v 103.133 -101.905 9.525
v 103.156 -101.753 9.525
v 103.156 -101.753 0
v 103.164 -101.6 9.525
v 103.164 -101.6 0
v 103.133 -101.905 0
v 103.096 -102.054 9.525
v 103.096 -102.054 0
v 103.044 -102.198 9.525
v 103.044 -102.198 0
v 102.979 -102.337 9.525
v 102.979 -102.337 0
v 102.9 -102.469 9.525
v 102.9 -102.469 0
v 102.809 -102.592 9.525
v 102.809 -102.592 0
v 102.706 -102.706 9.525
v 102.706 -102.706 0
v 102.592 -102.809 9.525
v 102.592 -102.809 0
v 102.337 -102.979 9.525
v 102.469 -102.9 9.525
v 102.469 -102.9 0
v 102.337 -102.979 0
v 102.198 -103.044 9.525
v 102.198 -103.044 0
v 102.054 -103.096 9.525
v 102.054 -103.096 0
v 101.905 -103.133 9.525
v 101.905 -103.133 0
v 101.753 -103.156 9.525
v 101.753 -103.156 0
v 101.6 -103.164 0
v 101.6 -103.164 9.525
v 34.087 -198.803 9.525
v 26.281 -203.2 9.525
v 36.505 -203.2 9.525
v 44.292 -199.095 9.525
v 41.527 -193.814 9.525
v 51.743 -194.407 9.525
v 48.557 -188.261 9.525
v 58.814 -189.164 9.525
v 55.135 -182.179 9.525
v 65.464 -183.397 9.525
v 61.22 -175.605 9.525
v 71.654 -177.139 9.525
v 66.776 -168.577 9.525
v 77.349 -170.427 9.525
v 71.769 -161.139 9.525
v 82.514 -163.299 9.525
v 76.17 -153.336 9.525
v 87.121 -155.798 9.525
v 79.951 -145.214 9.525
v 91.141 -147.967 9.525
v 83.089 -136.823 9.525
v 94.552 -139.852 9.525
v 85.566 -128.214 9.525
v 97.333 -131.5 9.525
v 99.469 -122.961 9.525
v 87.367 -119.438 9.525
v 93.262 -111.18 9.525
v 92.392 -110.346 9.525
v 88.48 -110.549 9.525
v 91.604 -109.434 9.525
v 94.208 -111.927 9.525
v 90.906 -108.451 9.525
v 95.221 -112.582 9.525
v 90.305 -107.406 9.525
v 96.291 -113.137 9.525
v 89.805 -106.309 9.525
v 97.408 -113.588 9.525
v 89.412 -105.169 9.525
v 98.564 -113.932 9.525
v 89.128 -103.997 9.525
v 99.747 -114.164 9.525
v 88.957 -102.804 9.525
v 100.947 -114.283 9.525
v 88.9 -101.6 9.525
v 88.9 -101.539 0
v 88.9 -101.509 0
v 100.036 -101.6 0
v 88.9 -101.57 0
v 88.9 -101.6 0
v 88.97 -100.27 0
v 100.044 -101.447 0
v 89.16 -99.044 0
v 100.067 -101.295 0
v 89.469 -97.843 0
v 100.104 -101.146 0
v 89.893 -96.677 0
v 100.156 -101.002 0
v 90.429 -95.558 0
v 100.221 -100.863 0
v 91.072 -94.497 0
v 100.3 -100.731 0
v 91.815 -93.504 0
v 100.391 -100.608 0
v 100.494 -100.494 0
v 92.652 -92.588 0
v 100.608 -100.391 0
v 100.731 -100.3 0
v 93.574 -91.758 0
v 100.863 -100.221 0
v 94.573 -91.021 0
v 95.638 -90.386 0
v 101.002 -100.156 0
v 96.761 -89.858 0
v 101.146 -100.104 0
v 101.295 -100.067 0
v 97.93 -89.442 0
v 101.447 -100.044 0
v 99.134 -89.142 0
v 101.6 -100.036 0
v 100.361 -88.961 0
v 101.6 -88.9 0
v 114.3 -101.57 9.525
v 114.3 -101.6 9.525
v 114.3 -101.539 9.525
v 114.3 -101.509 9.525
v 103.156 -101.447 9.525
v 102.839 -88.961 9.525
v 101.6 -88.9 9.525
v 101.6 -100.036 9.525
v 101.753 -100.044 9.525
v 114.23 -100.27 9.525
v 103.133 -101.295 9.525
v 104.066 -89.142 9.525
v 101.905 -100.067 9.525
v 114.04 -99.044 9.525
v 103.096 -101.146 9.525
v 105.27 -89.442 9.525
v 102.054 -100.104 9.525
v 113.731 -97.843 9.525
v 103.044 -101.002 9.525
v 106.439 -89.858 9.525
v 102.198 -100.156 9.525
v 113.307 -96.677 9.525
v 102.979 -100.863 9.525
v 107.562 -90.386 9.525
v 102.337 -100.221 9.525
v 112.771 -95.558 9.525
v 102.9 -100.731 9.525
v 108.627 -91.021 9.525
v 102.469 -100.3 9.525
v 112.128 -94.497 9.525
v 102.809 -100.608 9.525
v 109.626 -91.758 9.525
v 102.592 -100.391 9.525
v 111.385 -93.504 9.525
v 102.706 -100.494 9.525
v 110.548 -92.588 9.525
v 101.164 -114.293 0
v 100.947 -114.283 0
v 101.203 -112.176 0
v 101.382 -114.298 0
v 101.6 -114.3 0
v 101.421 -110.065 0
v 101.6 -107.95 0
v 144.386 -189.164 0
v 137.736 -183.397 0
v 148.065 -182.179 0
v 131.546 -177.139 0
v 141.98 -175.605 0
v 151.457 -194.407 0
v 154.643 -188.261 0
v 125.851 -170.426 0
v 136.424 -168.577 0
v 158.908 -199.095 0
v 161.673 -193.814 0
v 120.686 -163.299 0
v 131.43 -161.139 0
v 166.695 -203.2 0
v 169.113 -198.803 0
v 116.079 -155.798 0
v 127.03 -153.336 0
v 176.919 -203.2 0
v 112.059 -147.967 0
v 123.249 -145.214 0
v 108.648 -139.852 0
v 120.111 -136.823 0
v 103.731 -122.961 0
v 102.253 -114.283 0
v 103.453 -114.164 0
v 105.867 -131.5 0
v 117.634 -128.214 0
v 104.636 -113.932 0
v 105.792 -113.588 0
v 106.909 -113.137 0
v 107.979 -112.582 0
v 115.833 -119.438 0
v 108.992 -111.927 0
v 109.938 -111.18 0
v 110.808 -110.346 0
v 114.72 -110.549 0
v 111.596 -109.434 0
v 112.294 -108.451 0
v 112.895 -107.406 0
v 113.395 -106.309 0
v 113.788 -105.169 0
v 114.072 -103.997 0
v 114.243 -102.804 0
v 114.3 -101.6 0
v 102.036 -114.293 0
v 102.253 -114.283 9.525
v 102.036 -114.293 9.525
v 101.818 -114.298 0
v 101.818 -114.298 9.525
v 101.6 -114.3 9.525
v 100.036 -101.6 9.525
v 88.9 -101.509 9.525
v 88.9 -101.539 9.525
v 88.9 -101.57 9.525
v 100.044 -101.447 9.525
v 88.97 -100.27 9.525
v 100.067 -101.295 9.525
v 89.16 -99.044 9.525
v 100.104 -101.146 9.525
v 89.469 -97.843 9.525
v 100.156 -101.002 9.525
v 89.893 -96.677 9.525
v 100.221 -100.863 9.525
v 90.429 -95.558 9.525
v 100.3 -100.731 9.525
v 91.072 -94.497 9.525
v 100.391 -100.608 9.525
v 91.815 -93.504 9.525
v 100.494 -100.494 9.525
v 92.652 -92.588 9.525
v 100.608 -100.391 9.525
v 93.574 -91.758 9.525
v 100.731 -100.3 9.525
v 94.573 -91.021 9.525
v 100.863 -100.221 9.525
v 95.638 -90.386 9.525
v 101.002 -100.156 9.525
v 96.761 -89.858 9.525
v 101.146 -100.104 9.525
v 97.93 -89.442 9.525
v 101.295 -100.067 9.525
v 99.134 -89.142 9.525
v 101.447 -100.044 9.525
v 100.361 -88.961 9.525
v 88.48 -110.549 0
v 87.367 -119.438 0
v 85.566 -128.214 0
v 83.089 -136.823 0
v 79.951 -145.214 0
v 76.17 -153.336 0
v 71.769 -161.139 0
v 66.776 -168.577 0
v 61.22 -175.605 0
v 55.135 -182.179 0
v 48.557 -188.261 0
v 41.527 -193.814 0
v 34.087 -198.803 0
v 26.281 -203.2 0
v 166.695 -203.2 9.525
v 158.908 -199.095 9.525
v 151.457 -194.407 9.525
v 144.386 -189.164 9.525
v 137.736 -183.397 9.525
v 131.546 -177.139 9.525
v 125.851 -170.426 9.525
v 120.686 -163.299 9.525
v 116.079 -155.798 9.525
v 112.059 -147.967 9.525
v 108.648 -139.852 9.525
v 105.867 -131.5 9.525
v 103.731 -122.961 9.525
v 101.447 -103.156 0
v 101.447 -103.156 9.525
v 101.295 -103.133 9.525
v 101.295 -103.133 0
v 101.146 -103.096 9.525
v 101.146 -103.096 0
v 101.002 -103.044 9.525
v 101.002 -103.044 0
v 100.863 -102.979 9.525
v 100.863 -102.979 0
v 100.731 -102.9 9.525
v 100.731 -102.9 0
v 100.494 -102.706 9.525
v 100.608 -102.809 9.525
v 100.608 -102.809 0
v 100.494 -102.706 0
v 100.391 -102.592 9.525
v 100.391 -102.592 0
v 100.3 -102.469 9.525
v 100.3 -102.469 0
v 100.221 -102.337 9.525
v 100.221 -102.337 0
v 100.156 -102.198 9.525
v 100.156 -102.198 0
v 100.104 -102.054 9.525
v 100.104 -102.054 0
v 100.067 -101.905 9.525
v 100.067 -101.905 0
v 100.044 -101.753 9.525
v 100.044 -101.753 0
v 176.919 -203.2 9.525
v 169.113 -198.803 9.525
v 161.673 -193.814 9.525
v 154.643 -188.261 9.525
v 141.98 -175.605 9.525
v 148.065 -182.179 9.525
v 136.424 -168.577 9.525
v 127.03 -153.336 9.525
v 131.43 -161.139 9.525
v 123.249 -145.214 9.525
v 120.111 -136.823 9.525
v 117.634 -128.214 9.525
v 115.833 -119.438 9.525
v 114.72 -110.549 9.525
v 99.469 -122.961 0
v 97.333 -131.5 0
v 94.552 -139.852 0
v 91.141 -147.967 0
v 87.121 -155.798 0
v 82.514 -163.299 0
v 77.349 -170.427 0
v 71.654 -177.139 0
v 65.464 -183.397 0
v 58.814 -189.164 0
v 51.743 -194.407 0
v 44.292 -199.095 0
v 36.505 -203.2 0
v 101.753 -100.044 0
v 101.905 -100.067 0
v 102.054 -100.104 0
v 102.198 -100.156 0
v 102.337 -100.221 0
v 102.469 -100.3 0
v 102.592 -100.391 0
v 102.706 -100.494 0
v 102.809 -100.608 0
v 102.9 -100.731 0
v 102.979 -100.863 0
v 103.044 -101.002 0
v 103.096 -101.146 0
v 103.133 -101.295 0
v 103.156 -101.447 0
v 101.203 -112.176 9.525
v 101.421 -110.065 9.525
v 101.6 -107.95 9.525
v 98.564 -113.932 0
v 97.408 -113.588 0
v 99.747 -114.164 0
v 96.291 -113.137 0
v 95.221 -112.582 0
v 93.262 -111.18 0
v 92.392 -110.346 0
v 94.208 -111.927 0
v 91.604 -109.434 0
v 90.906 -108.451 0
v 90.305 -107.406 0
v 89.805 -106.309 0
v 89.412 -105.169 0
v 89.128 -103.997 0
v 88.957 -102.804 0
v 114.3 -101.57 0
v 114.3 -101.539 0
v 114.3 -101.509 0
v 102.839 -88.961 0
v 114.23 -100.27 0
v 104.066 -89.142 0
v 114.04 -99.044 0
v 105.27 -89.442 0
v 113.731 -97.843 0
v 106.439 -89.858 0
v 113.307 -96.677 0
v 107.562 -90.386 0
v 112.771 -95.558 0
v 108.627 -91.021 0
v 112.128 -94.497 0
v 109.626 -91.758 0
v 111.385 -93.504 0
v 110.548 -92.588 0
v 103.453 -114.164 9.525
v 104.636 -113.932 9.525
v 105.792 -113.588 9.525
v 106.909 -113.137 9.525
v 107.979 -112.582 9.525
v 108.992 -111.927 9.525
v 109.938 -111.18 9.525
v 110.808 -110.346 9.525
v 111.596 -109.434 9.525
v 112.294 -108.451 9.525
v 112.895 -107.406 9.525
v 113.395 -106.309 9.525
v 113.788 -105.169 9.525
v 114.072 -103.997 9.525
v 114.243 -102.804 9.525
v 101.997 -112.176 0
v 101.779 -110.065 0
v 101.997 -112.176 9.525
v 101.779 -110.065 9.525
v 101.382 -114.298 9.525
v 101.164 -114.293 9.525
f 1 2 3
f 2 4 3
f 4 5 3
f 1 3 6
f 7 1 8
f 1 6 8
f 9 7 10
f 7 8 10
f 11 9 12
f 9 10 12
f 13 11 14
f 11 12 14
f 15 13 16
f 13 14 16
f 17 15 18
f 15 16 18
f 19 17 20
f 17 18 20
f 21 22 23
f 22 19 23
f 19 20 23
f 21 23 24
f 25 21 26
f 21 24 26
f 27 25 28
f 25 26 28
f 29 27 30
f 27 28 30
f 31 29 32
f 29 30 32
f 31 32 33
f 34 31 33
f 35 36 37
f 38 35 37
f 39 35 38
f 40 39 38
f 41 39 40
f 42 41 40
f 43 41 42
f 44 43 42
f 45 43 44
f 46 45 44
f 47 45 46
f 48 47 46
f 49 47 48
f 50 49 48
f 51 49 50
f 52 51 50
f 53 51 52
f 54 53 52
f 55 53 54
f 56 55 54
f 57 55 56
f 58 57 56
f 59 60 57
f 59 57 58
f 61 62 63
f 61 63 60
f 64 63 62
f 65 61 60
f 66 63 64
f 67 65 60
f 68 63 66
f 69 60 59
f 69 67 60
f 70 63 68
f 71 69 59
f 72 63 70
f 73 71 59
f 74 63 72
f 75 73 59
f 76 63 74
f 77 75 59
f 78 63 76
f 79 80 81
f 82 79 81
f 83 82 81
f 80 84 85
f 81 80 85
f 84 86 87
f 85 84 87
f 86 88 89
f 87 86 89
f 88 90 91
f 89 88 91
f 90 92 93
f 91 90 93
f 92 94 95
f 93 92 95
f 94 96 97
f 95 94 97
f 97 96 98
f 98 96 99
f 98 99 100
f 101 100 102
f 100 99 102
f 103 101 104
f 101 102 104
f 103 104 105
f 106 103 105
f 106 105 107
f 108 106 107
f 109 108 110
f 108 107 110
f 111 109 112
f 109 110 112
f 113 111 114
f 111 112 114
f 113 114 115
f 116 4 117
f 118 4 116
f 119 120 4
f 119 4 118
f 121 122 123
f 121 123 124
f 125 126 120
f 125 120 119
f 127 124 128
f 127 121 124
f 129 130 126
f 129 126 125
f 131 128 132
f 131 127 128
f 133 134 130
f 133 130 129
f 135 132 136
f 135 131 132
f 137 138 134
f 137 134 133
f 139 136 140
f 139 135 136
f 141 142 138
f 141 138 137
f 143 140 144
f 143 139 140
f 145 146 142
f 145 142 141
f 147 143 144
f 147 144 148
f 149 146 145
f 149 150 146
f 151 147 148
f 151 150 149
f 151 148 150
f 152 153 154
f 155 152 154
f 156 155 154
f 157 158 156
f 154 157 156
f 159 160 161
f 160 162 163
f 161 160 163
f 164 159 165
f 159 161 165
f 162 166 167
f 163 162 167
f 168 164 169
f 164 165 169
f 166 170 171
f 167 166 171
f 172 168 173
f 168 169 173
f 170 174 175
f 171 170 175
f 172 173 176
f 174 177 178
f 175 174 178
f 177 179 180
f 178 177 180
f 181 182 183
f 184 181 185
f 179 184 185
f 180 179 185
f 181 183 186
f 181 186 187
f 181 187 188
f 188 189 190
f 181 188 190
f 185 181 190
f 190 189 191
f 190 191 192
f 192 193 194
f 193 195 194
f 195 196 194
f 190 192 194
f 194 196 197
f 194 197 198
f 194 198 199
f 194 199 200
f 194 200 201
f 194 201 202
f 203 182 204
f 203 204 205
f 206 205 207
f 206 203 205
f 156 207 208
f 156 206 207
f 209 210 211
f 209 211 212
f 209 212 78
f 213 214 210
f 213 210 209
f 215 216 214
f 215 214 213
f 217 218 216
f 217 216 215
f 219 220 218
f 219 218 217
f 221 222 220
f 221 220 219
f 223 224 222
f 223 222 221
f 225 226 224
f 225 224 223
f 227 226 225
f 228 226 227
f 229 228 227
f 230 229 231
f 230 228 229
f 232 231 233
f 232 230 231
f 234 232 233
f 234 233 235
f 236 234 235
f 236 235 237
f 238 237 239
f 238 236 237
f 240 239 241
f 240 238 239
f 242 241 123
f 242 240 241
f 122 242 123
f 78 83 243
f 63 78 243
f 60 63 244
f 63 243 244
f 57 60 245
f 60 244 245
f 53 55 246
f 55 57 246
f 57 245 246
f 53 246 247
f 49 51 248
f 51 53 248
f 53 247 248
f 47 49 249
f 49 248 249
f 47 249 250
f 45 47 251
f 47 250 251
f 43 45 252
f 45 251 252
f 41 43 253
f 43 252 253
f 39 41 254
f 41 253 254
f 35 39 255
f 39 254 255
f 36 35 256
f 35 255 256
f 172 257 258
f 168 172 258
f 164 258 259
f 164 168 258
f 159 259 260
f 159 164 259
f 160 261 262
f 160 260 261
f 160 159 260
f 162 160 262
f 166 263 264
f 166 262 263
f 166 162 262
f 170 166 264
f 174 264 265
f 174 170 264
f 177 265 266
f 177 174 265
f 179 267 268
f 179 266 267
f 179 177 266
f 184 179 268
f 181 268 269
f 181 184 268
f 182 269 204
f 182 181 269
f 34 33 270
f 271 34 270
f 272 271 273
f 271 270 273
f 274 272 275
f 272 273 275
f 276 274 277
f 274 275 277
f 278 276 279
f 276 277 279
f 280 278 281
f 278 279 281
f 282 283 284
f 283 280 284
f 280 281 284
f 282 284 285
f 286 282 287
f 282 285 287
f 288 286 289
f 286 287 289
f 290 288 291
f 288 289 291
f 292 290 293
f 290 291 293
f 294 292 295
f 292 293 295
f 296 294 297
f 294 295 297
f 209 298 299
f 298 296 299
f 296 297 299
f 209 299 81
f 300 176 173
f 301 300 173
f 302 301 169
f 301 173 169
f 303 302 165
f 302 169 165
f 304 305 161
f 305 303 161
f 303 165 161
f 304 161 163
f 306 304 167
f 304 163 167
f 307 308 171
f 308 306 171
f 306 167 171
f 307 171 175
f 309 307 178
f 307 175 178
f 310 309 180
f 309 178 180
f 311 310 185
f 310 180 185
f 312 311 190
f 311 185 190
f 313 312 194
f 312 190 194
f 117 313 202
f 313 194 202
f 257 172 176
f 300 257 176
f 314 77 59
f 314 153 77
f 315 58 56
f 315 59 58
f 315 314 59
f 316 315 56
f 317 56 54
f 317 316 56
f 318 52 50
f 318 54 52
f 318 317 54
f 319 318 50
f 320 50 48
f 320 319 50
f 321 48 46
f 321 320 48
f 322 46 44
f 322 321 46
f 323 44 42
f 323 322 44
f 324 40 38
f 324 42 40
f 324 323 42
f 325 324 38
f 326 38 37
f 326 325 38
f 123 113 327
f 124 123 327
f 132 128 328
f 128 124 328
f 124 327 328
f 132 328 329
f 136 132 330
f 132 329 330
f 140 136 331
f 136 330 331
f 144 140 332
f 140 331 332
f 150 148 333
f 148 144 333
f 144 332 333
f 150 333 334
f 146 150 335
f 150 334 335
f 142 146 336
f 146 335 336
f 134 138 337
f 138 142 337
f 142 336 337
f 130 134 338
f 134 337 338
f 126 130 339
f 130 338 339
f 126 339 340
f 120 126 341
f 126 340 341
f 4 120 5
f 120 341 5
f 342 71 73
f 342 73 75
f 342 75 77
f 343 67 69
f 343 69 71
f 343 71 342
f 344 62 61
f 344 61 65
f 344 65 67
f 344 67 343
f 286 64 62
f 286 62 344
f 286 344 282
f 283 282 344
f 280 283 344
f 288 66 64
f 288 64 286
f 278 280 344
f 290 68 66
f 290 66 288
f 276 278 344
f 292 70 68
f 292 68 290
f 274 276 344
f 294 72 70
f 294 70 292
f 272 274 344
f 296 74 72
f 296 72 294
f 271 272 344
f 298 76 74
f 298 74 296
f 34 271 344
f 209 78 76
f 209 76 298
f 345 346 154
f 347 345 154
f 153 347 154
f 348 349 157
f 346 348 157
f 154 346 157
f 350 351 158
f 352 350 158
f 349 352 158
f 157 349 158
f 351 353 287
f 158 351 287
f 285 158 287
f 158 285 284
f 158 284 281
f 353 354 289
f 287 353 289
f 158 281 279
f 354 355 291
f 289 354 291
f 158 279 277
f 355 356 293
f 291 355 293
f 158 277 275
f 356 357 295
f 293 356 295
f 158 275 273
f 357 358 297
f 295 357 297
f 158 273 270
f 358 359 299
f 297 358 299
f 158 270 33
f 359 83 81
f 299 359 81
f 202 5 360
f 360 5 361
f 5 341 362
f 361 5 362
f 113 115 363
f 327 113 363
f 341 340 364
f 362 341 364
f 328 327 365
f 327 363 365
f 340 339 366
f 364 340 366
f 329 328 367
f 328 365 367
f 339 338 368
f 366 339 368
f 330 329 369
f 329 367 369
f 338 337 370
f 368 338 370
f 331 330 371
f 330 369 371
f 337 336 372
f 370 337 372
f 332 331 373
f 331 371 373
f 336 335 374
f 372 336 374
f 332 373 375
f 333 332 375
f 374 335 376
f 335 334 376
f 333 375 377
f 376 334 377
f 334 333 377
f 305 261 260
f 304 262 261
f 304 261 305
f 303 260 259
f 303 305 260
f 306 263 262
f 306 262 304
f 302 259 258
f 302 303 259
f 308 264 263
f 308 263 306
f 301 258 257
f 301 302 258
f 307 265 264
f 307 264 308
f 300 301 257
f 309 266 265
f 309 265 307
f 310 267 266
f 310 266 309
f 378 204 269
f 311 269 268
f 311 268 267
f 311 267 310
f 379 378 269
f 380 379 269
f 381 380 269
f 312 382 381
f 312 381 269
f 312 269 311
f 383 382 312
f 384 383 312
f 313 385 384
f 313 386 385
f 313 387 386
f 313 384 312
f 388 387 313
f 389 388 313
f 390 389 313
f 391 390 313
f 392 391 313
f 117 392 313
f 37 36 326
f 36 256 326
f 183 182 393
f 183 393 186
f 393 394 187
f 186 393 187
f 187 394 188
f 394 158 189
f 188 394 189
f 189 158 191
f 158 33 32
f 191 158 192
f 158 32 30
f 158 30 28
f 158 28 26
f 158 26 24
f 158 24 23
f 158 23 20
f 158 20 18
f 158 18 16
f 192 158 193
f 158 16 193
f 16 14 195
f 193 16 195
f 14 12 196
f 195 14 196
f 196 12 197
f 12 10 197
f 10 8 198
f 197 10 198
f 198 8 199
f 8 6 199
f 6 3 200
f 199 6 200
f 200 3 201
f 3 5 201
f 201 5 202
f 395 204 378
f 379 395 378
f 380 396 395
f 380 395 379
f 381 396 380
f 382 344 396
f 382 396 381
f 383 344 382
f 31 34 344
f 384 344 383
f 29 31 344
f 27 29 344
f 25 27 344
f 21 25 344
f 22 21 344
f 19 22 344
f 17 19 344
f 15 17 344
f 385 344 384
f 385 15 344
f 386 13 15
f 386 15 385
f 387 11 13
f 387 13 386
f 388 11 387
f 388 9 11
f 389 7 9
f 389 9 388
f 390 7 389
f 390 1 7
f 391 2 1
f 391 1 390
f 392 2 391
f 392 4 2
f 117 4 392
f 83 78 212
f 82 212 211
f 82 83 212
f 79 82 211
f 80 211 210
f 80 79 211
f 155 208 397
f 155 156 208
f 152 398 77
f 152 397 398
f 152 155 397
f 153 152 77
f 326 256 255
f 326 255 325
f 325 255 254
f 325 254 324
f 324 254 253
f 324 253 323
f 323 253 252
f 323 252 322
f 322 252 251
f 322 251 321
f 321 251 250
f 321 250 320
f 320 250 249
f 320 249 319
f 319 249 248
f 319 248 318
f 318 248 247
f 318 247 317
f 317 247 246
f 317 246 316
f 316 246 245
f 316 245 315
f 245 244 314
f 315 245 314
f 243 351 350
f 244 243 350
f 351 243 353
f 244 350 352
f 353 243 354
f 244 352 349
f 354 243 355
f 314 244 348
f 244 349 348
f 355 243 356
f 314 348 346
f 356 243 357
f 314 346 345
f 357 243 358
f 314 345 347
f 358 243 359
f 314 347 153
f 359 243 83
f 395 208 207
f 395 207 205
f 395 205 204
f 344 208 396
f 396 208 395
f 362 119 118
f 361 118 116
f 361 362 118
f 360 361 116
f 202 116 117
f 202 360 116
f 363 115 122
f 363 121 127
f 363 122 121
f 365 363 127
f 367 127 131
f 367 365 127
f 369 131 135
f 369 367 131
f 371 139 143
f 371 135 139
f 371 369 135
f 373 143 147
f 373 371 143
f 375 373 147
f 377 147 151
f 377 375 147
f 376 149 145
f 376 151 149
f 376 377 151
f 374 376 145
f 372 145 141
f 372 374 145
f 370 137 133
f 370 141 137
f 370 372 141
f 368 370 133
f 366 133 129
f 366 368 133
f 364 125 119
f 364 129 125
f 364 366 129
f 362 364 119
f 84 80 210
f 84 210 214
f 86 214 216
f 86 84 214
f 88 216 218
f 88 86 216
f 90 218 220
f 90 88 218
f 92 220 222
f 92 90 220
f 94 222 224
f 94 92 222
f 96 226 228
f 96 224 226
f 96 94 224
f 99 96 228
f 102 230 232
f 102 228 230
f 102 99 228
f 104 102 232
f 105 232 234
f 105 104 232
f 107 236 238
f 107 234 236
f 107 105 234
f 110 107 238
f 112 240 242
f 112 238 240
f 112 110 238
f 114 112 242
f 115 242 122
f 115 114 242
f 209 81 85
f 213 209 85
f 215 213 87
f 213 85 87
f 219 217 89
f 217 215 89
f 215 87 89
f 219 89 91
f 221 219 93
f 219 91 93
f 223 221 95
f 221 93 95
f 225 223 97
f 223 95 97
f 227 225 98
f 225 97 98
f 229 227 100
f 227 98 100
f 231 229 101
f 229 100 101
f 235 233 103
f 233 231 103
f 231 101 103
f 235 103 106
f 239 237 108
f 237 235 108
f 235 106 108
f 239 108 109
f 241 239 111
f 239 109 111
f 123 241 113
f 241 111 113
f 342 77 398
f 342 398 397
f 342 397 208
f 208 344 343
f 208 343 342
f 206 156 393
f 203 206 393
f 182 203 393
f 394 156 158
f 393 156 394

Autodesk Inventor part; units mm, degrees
ref_plane "YZ Plane" through (0, 0, 0) normal (1, 0, 0) x (0, 1, 0)
ref_plane "XZ Plane" through (0, 0, 0) normal (0, 1, 0) x (-1, 0, 0)
ref_plane "XY Plane" through (0, 0, 0) normal (0, 0, 1) x (1, 0, 0)
sketch "Sketch1" plane through (0, 0, 0) normal (0, 0, 1) x (1, 0, 0)
  line L0 (0, 0) -> (203.2, 0)
  line L1 (203.2, 0) -> (203.2, -203.2)
  line L2 (0, -203.2) -> (0, 0)
  line L3 (0, -101.6) -> (203.2, -101.6)
  circle A0 centre (101.6, -101.6) radius 1.5635
  circle A1 centre (101.6, -101.6) radius 12.7
  arc A2 (26.281, -203.2) -> (88.9003, -101.509) centre (-26.321, -100.6834) ccw
  arc A3 (36.5054, -203.2) -> (101.6, -107.95) centre (-13.2987, -99.2953) ccw
  line L4 (101.6, -246.9942) -> (101.6, 0)
  arc A4 (114.2997, -101.509) -> (176.919, -203.2) centre (229.521, -100.6834) ccw
  arc A5 (101.6, -107.95) -> (166.6946, -203.2) centre (216.4987, -99.2953) ccw
  line L5 (166.6946, -203.2) -> (176.919, -203.2)
  line L6 (26.281, -203.2) -> (36.5054, -203.2)
  line L7 (0, -203.2) -> (203.2, -203.2)
  point P0 (88.9, -101.6)
  point P1 (88.8996, -101.6)
  point P2 (100.9466, -114.2832)
  point P3 (102.2534, -114.2832)
  point P4 (114.3004, -101.6)
  point P5 (114.3, -101.6)
  point P6 (171.8068, -203.2)
  point P7 (101.6, -123.4971)
  point P8 (114.2997, -101.509)
  dimension "d10" = 25.4
  dimension "d7" = 203.2
  dimension "d8" = 203.2
  dimension "d9" = 3.127
  dimension "d11" = 115.2242
  dimension "d12" = 115.2242
  dimension "d15" = 26.281
  dimension "d16" = 6.35
  dimension "d18" = 101.6
  dimension "d19" = 10.2243
extrude "Extrusion1" add sketch "Sketch1" along normal blind 9.525 contours L4 A0 L3 A1 | A1 L3 A0 L4 | L3 A0 L4 A3 A1 | A1 A3 L6 A2 | A3 L4 A1 | A1 A5 L4 A0 L3 | A4 L5 A5 A1 | L4 A5 A1
properties part number "rod support main"
